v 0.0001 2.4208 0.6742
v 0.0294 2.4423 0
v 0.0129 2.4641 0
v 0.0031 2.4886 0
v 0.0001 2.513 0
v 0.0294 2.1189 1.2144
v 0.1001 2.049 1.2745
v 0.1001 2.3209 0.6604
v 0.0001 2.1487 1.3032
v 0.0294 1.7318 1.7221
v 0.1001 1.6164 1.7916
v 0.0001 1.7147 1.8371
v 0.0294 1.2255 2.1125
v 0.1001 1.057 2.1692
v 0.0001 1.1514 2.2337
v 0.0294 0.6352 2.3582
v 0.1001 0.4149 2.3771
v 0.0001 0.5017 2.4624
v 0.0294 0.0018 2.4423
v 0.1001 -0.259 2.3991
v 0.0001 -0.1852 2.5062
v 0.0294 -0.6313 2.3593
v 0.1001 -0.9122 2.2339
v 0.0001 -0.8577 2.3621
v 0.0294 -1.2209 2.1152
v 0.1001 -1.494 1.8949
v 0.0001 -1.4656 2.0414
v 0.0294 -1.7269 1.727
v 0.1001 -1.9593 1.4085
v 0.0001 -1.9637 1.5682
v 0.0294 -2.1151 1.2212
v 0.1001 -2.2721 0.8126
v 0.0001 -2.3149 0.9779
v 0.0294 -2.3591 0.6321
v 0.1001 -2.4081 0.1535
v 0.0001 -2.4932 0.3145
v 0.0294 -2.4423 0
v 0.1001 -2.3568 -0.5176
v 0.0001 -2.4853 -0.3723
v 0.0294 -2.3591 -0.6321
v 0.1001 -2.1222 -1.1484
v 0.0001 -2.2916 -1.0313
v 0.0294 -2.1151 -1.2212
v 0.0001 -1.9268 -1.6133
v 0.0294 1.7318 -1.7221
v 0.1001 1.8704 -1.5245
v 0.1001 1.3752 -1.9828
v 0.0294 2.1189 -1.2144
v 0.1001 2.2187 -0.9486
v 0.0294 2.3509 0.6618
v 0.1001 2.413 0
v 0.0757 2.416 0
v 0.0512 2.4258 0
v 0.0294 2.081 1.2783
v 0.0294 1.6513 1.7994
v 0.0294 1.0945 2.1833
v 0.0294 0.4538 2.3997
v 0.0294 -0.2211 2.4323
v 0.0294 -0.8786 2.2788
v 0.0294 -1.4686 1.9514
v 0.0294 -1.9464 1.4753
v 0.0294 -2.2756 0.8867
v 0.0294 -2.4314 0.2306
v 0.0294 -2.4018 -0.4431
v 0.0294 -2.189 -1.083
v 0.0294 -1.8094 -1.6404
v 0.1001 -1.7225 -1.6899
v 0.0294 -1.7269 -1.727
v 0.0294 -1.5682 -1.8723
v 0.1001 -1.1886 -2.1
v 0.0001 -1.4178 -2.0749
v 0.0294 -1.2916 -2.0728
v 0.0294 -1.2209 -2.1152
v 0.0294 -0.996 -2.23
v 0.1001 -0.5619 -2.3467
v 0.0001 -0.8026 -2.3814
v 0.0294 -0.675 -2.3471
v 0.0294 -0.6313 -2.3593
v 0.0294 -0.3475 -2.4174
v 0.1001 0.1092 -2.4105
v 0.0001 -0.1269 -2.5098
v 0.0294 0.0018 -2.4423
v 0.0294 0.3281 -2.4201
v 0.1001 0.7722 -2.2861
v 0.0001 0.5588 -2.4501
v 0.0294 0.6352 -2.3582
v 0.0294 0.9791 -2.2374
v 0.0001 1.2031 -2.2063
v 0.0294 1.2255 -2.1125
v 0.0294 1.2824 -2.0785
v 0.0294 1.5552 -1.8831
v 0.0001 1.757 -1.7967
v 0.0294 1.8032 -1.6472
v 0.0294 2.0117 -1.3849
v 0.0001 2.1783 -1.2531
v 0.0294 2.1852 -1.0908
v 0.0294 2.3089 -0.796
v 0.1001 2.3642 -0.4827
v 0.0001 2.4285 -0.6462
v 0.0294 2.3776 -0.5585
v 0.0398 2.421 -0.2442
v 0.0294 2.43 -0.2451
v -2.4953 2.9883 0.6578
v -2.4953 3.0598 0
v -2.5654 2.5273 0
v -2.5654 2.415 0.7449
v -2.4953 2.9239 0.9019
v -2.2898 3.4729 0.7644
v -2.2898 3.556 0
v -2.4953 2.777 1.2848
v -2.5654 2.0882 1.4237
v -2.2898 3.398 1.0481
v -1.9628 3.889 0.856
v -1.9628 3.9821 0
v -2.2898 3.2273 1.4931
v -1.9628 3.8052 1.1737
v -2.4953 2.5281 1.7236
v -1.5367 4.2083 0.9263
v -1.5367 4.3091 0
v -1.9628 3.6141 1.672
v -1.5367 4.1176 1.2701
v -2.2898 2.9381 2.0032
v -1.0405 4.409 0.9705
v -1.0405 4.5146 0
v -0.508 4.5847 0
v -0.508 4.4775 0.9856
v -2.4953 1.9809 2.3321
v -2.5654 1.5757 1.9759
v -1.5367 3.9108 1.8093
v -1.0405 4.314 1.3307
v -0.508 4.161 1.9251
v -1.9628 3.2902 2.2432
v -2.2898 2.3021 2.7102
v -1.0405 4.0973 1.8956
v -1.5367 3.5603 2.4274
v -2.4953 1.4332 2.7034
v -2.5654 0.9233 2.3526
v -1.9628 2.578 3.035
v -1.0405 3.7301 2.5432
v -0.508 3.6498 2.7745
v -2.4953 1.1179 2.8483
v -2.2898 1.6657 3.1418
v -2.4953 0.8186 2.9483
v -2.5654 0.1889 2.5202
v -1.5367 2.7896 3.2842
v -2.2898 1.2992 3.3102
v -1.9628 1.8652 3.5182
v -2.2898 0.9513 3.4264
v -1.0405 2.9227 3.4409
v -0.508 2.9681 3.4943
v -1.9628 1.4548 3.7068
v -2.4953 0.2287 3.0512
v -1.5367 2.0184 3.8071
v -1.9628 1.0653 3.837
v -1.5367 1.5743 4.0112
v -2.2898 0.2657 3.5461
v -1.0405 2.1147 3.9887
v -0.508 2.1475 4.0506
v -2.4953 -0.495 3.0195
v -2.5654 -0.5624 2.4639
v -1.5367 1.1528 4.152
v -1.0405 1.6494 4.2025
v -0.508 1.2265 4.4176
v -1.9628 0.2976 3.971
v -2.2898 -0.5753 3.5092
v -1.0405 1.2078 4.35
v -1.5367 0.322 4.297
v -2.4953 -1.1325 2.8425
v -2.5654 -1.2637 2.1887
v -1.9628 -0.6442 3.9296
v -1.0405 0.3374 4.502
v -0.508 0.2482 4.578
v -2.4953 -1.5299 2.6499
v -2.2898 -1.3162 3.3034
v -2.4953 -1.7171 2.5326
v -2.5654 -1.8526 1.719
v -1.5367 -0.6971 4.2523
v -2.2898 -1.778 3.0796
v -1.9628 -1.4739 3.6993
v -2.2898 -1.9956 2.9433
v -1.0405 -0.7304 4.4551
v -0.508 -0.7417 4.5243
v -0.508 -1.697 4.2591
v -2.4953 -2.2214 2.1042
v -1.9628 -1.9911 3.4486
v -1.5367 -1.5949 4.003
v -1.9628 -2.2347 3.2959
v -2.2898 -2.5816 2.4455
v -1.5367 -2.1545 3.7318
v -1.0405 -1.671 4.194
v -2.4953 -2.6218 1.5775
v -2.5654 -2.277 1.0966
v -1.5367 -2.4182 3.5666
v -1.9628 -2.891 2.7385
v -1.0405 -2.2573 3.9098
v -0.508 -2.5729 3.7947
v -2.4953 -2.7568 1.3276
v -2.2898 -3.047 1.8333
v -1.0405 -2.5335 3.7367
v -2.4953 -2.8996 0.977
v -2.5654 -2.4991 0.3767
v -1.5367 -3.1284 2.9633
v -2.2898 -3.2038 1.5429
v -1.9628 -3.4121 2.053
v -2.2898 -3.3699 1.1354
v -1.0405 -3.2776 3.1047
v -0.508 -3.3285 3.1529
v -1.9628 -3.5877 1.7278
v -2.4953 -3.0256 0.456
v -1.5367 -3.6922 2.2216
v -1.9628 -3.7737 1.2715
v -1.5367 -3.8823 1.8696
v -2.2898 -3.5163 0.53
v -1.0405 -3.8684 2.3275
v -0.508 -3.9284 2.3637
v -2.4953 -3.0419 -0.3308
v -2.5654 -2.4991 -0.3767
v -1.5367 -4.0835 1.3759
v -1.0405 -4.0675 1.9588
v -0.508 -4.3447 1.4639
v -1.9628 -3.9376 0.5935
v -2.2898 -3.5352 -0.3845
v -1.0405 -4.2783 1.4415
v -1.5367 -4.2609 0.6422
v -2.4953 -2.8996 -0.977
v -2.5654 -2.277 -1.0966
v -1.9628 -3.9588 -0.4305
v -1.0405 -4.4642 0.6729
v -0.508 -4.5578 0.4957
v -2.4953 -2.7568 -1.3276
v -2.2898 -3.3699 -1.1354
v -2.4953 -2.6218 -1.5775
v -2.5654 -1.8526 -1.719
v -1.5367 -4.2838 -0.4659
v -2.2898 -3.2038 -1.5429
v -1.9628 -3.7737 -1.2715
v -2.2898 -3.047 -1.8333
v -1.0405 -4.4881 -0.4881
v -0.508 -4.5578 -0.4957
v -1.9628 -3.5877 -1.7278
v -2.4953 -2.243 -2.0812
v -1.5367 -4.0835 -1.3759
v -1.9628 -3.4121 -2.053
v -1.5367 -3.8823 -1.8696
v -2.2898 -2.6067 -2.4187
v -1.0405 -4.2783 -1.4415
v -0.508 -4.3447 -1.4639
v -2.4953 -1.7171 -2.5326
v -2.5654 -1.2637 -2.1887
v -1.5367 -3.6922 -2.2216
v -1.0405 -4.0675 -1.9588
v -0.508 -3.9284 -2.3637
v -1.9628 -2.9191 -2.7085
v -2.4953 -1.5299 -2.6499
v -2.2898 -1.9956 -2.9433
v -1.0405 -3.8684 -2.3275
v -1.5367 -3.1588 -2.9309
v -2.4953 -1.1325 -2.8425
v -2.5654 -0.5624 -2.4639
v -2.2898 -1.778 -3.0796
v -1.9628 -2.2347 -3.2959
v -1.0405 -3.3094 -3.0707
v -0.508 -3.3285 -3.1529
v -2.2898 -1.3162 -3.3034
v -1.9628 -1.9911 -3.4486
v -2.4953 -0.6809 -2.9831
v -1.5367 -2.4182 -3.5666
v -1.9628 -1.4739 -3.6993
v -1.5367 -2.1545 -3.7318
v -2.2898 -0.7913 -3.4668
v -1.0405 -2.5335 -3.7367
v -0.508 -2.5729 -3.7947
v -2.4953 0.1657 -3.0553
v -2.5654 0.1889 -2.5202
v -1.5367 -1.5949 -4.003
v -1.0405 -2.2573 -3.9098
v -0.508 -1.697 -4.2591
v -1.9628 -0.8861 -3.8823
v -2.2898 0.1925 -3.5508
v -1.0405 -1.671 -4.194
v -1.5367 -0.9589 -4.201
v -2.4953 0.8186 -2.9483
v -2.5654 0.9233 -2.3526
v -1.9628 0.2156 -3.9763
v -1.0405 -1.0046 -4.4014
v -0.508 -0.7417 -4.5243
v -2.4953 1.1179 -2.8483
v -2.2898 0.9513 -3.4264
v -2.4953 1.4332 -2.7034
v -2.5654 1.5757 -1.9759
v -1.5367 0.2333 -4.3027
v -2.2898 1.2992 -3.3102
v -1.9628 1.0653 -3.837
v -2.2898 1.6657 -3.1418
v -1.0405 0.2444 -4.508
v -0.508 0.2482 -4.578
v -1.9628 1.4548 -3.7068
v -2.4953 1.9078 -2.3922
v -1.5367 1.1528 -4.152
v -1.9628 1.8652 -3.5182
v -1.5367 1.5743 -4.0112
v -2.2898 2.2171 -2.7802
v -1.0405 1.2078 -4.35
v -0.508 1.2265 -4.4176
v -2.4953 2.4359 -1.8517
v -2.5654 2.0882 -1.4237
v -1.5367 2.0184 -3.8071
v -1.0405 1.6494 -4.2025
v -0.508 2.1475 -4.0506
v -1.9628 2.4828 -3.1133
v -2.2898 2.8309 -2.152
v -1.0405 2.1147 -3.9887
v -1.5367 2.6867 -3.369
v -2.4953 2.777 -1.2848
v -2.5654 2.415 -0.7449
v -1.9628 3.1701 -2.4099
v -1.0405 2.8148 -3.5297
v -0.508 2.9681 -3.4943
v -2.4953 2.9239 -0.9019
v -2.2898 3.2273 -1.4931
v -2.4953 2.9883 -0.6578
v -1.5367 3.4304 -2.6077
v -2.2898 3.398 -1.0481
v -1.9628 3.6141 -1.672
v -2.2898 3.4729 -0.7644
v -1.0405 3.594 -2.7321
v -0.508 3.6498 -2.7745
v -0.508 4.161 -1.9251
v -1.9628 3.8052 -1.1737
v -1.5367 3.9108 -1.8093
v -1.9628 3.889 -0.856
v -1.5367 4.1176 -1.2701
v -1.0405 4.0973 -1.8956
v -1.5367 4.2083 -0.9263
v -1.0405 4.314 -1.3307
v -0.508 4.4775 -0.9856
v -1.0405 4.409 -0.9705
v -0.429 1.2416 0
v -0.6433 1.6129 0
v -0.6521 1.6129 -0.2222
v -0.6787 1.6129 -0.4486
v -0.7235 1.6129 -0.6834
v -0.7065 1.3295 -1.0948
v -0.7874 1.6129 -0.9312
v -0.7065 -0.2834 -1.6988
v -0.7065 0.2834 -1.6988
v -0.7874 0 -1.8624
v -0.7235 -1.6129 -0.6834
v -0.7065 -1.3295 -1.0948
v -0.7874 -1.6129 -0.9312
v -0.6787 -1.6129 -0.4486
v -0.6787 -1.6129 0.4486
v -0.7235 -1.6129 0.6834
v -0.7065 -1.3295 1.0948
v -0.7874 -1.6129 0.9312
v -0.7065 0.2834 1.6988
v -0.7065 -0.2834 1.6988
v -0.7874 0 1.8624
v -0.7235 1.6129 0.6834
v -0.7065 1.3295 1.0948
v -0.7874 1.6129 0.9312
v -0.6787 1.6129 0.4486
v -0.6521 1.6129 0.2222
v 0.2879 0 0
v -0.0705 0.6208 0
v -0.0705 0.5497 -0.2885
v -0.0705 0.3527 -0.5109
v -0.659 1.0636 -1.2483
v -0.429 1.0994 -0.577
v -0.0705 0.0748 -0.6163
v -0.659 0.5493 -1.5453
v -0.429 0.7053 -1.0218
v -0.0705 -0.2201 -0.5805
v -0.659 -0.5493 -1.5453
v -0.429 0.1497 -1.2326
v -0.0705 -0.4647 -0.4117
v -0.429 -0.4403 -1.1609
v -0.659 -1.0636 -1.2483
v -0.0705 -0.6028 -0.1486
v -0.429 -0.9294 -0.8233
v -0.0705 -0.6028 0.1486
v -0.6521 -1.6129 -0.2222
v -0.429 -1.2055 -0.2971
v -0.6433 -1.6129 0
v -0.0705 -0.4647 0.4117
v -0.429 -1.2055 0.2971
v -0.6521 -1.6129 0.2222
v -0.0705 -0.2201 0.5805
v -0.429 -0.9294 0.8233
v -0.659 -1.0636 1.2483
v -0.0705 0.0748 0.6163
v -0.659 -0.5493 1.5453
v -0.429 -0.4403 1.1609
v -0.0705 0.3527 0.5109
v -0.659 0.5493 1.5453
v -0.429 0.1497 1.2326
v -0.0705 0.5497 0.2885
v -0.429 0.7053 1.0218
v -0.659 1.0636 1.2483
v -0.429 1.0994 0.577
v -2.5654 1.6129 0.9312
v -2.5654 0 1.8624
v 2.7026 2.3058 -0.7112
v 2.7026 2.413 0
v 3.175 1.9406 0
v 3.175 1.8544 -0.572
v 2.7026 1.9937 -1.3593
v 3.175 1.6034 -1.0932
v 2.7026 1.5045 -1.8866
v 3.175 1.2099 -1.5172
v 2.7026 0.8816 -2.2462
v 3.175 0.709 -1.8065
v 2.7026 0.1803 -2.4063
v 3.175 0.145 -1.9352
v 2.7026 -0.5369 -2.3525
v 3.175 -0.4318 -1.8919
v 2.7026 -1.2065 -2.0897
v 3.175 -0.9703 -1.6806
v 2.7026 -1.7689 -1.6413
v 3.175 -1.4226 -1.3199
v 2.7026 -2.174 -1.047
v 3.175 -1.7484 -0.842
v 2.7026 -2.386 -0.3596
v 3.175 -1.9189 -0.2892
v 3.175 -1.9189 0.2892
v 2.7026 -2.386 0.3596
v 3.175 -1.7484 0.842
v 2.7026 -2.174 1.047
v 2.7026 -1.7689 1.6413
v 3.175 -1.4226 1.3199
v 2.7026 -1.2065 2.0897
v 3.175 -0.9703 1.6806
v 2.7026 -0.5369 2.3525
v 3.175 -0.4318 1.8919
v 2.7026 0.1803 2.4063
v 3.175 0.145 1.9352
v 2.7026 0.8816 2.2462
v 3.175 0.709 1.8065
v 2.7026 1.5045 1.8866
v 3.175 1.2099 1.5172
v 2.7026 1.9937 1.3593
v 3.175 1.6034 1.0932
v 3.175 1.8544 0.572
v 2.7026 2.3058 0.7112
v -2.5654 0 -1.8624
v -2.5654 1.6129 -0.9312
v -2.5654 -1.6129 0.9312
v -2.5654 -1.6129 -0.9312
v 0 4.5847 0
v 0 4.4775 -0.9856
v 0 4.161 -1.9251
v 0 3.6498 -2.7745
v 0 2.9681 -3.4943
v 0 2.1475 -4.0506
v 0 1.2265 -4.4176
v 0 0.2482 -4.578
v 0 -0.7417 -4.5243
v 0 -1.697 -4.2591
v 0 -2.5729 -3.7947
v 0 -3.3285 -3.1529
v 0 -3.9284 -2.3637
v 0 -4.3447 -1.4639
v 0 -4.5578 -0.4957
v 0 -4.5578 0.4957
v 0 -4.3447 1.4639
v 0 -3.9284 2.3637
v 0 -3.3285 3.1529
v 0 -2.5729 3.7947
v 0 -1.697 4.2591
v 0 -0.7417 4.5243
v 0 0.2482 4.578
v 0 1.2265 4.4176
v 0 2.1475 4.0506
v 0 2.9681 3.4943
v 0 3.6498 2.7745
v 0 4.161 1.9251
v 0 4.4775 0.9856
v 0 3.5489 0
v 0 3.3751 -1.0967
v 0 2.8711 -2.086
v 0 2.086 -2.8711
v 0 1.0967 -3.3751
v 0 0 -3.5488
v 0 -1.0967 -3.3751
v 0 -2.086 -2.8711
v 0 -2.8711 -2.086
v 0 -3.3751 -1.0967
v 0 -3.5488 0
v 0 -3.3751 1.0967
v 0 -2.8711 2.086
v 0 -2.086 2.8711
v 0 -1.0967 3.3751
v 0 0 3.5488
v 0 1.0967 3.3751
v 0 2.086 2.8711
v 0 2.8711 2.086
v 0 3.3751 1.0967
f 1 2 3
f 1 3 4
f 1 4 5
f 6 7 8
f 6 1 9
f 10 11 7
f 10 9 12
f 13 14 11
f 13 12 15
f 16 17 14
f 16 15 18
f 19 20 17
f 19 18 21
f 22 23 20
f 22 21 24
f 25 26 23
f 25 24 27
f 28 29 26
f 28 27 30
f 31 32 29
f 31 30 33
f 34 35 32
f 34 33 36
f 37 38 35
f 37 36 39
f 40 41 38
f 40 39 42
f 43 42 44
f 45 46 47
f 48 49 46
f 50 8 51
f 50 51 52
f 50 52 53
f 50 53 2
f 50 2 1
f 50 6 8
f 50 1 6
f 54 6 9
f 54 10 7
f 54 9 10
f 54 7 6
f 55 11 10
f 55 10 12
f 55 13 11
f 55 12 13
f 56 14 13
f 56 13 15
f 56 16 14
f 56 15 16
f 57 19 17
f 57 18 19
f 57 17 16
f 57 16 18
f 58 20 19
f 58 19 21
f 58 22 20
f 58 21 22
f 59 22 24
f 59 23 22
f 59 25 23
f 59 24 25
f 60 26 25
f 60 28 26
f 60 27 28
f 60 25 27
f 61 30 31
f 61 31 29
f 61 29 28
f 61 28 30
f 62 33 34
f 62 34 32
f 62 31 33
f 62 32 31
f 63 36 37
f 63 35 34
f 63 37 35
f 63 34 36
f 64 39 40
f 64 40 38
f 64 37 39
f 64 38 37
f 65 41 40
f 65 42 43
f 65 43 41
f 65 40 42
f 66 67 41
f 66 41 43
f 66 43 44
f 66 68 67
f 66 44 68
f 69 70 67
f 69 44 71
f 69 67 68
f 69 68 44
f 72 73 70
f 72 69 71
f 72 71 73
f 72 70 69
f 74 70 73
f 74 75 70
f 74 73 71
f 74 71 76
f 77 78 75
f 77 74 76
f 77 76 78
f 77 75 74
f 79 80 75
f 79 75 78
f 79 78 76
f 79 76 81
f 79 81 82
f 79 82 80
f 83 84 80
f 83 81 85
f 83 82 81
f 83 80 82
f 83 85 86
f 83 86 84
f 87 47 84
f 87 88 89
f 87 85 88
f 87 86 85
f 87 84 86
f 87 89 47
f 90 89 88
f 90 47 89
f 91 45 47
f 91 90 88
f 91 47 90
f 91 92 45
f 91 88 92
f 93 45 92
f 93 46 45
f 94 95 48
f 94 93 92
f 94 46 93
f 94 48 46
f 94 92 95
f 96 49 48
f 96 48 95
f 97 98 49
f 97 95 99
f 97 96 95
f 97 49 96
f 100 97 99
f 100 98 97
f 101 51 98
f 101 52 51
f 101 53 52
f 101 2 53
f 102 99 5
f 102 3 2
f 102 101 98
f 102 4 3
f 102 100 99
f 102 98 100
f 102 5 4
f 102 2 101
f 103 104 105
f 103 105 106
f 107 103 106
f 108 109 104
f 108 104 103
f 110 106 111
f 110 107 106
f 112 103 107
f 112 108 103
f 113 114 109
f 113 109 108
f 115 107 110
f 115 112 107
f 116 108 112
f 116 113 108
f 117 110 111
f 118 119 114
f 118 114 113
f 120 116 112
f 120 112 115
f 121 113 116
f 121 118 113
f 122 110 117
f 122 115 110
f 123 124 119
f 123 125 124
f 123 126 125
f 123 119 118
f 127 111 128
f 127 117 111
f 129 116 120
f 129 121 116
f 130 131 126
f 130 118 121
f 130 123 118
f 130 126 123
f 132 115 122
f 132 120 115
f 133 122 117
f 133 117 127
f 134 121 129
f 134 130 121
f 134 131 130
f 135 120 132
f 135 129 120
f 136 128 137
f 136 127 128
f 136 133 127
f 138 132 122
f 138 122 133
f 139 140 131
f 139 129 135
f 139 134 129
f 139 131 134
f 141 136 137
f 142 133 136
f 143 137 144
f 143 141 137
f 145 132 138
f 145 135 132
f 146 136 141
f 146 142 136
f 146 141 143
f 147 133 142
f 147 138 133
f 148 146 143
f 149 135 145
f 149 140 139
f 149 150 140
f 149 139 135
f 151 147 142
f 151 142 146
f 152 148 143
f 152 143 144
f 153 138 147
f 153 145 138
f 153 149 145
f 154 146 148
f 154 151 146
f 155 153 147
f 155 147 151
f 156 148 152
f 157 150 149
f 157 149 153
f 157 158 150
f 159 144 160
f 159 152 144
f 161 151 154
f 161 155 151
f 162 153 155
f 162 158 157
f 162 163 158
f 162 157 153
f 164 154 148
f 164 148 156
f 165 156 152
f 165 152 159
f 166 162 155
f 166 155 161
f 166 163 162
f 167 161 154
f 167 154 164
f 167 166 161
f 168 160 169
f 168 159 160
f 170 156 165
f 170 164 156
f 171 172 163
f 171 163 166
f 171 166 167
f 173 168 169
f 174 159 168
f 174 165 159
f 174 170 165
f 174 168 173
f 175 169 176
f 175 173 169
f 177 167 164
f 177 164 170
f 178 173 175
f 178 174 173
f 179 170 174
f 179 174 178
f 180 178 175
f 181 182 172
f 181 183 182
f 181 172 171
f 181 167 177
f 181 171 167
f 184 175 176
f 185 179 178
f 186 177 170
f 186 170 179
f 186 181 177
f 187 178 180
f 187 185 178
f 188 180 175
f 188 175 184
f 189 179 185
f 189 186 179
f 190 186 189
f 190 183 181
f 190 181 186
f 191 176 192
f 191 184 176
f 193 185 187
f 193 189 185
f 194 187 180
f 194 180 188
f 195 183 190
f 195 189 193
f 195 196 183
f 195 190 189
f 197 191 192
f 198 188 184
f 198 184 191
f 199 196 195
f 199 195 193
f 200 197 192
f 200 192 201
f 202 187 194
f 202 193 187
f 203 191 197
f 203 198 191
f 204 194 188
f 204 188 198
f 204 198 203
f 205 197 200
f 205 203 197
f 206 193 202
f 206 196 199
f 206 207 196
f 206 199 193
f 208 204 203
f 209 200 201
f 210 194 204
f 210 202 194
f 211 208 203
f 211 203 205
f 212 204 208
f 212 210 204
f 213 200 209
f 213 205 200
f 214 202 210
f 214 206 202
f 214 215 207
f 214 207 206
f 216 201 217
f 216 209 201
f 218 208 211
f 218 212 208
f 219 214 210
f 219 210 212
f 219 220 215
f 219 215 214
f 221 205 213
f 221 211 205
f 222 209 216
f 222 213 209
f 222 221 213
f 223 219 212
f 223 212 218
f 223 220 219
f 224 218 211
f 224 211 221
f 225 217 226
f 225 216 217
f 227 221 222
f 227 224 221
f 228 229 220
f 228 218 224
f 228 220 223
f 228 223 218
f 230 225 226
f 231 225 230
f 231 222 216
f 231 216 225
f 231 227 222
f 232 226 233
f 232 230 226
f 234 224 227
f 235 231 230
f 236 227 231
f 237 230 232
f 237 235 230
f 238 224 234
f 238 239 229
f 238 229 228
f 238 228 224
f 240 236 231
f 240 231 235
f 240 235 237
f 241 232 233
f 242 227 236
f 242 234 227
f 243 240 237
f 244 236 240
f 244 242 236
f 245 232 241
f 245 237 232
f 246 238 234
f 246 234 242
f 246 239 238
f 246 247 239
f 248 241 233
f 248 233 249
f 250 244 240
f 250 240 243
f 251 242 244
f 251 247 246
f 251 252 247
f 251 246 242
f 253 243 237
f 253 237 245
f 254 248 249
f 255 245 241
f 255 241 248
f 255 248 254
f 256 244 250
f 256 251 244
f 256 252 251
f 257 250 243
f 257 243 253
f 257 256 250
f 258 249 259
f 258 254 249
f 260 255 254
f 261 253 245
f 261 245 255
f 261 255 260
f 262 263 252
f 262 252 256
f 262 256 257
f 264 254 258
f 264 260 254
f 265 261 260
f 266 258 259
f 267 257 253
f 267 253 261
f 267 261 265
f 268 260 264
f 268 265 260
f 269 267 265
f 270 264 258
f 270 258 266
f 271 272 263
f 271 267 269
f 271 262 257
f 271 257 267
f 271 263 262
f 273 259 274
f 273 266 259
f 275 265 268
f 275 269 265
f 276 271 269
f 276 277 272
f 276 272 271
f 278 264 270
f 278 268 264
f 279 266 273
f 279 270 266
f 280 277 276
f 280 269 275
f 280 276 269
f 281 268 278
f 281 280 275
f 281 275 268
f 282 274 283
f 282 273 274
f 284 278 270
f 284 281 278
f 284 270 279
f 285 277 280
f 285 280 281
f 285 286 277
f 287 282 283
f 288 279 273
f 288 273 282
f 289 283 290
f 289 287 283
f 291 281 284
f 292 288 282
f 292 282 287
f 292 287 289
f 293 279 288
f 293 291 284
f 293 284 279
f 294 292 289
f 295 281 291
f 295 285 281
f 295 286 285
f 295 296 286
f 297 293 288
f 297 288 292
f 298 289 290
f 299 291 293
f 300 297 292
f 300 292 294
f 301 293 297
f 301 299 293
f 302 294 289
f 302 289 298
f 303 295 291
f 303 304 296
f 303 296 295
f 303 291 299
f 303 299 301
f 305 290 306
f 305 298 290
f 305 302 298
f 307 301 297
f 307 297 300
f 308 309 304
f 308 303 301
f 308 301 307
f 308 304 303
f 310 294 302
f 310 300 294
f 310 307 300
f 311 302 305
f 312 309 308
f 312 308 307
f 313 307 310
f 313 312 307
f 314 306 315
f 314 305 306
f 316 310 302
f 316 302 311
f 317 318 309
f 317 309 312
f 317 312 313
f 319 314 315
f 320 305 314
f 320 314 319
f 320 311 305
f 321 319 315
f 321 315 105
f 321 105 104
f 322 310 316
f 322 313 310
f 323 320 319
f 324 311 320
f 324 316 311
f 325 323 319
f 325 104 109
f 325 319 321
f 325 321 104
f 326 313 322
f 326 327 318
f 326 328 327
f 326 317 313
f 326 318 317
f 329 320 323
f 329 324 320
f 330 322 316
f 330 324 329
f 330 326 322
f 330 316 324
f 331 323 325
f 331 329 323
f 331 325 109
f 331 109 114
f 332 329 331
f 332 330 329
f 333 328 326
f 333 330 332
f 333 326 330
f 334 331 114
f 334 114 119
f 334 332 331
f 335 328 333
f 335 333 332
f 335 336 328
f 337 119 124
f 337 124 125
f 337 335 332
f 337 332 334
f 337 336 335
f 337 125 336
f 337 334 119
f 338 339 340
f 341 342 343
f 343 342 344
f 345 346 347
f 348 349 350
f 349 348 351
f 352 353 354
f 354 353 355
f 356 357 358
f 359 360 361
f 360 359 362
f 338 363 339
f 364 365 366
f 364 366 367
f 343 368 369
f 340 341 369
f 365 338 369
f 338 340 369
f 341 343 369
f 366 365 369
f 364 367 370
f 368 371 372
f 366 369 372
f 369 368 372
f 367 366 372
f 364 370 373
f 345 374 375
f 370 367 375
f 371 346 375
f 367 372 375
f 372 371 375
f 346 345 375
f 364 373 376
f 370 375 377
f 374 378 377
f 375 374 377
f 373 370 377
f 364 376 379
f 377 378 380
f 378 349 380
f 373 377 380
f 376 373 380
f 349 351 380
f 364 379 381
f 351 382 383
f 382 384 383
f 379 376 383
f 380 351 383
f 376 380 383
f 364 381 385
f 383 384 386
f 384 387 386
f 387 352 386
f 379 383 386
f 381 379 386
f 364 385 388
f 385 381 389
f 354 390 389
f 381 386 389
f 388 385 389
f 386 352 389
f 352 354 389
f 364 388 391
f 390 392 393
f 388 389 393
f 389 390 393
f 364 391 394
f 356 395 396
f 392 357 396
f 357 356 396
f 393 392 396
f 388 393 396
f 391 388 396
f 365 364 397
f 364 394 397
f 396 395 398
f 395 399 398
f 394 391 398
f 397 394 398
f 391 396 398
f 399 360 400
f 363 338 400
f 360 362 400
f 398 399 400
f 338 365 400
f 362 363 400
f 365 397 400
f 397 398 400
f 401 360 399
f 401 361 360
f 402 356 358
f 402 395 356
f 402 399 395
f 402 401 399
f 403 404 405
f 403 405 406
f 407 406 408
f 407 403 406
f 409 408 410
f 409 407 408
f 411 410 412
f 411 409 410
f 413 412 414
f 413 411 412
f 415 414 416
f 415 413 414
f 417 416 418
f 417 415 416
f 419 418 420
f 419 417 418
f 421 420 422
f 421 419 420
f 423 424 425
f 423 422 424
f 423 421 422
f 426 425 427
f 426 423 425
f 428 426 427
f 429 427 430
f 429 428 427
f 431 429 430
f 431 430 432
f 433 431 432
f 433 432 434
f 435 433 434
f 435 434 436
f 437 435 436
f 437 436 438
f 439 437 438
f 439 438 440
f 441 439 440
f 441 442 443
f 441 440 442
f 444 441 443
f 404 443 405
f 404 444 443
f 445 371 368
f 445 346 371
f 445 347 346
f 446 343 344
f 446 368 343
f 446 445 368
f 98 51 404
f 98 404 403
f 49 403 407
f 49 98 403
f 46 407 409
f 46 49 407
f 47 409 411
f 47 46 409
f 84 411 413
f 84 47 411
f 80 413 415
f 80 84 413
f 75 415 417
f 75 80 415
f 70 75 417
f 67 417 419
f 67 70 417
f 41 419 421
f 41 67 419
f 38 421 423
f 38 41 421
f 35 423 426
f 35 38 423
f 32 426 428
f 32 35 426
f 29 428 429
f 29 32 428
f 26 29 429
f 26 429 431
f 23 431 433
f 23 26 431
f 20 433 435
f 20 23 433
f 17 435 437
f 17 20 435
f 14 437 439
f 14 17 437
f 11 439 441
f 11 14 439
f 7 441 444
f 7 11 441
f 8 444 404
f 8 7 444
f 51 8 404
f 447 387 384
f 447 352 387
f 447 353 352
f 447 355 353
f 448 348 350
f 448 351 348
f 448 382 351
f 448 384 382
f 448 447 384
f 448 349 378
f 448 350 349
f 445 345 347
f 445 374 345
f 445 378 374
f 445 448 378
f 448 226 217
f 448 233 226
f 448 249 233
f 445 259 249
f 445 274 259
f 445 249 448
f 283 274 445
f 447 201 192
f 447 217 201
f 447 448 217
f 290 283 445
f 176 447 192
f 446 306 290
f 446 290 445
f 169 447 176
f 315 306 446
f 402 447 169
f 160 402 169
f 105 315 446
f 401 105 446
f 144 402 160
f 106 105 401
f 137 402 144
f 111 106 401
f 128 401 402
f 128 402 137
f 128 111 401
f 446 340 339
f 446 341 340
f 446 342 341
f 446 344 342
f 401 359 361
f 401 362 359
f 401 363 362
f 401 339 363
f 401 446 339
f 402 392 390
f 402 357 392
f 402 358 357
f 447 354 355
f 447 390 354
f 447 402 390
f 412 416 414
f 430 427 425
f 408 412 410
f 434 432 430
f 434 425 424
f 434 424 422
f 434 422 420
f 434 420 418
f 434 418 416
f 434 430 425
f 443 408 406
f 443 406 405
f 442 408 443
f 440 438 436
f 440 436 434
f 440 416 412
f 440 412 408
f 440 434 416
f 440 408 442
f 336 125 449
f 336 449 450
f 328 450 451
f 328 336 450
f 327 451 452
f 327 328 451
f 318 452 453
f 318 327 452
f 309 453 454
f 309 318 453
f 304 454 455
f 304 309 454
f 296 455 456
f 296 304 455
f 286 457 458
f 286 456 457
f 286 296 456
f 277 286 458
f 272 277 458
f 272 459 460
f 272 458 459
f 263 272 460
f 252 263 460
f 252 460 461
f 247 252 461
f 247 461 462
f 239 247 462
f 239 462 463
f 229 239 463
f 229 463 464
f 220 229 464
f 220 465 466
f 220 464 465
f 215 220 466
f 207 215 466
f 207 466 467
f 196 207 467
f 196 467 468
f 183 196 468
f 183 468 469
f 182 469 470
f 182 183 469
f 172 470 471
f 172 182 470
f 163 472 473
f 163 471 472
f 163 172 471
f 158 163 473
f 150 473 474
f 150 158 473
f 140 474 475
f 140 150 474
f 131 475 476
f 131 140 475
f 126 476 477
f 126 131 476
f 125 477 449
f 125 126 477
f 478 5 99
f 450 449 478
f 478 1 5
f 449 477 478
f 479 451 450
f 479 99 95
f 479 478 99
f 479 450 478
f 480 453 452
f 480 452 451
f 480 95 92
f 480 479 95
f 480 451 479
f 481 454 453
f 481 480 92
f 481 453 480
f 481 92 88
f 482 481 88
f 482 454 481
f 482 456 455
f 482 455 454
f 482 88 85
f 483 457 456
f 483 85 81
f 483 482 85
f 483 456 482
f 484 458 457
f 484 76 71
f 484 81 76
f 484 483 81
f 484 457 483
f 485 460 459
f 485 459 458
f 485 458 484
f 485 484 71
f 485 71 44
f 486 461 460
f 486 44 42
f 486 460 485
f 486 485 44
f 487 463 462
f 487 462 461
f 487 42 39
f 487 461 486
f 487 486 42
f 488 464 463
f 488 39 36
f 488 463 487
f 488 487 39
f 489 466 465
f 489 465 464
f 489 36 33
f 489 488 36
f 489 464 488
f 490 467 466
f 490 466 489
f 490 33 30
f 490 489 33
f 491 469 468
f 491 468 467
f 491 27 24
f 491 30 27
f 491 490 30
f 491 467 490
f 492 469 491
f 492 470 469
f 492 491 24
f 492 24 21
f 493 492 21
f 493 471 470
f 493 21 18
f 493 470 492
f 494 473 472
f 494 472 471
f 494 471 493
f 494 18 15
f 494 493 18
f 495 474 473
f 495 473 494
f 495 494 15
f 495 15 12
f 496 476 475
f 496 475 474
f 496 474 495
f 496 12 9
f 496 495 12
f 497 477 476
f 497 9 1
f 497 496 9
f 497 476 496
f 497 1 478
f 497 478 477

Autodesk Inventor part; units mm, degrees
ref_plane "YZ Plane" through (0, 0, 0) normal (1, 0, 0) x (0, 1, 0)
ref_plane "XZ Plane" through (0, 0, 0) normal (0, 1, 0) x (-1, 0, 0)
sketch "Sketch1" plane through (0, 0, 0) normal (0, 0, 1) x (1, 0, 0)
  line L0 (0.2879, 0) -> (3.175, 0)
  line L1 (3.175, 0) -> (3.175, 2.413)
  line L2 (3.175, 2.413) -> (2.1084, 2.413)
  line L3 (2.1084, 2.413) -> (0.0001, 2.413)
  line L4 (0.0001, 2.413) -> (0, 2.413)
  line L5 (0, 2.413) -> (0, 4.5847)
  line L6 (0, 4.5847) -> (-2.5654, 4.5847)
  line L7 (-2.5654, 4.5847) -> (-2.5654, 1.8624)
  line L8 (-2.5654, 1.8624) -> (-0.7874, 1.8624)
  line L9 (-0.7874, 1.8624) -> (0.2879, 0)
  line L10 (-3.7135, 0) -> (4.3231, 0) projected
  line L11 (0, -0.9169) -> (0, 5.5016) projected
  line L12 (2.1084, 2.413) -> (0, 2.413) construction
  dimension "d1" = 1.0666
  dimension "d2" = 2.1083
  dimension "d3" = 2.5654
  dimension "d4" = 1.778
  dimension "d5" = 60
  dimension "d6" = 4.826
  dimension "d7" = 4.826
  dimension "d8" = 3.7248
  dimension "d9" = 9.1694
  dimension "d26" = 3.175
revolve "Body" add sketch "Sketch1" angle 360 about axis through (0.2879, 0, 0) along (1, 0, 0) contours L9 L11 L3 L2 L1 L0 | L9 L8 L7 L6 L5 L11
sketch "Sketch2" plane through (-2.5654, 0, 0) normal (-1, 0, 0) x (0, 0, 1)
  circle A0 centre (0, 0) radius 1.8624 projected
  line L0 (0, -6.4186) -> (0, 6.4186) projected
  line L1 (-6.4186, 0) -> (6.4186, 0) projected
  line L2 (1.8624, 0) -> (0.9312, -1.6129)
  line L3 (0.9312, -1.6129) -> (-0.9312, -1.6129)
  line L4 (-0.9312, -1.6129) -> (-1.8624, 0)
  line L5 (-1.8624, 0) -> (-0.9312, 1.6129)
  line L6 (-0.9312, 1.6129) -> (0.9312, 1.6129)
  line L7 (0.9312, 1.6129) -> (1.8624, 0)
extrude "Slot" add sketch "Sketch2" against normal up to next contours L7 A0 | A0 L2 | L6 L0 A0 | A0 L0 L3 | L0 L6 A0 | A0 L3 L0 | L4 A0 | A0 L5
fillet "Fillet1" radius 2.0574 1 edges at (-2.5654, -4.5847, 0)
thread "Thread" size "10-32 UNF" class "2A" standard "ANSI Unified Screw Threads" length 1.0666
chamfer "Chamfer1" distance 0.4724 distance2 0.4724 1 edges at (3.175, -2.413, 0) measured on face at (3.175, -0.9842, 0.5798)
ref_plane "Work Plane1" through (29, 0, 0) normal (0, -1, 0) x (1, 0, 0)
fillet "Fillet2" radius 0.1 1 edges at (0.0001, -2.413, 0)
equation "\"d30\" = R"
equation "\"d17\" = RR"
equation "\"d13\" = GEL"
equation "\"d15\" = -0.5 * SPD + 0.5 * GD"
equation "\"d16\" = GUL"
equation "\"d1\" = GEL"
equation "\"d3\" = KOH"
equation "\"d4\" = INTI"
equation "\"d6\" = GD"
equation "\"d7\" = BDM"
equation "\"d8\" = 1.1547 * SW"
equation "\"d9\" = KOD"
equation "\"d26\" = NLG"
equation "\"GD\" = NND"
equation "\"NLG\" = 3.175"
equation "\"GEL\" = 1.0666"
equation "\"KOD\" = 9.1694"
equation "\"KOH\" = 2.5654"
equation "\"INTI\" = 1.778"
equation "\"GAL\" = 2.1082"
equation "\"GUL\" = 0.47244"
equation "\"BDM\" = NND"
equation "\"SW\" = 3.2258"
equation "\"RR\" = 2.0574"
equation "\"SPD\" = 3.88112"
equation "\"R\" = 0.1"
equation "\"TOA\" = 30deg"
equation "\"GD1\" = SPD"
equation "\"THREADDIA\" = 4.826"
equation "\"KOH1\" = 0.508"
equation "\"NND\" = 4.826"
equation "\"E0\" = 3.72593"
properties part number "ANSI B18.3 - No. 10-32 - 1/8, HSBHCSI" material "Steel, Mild"
